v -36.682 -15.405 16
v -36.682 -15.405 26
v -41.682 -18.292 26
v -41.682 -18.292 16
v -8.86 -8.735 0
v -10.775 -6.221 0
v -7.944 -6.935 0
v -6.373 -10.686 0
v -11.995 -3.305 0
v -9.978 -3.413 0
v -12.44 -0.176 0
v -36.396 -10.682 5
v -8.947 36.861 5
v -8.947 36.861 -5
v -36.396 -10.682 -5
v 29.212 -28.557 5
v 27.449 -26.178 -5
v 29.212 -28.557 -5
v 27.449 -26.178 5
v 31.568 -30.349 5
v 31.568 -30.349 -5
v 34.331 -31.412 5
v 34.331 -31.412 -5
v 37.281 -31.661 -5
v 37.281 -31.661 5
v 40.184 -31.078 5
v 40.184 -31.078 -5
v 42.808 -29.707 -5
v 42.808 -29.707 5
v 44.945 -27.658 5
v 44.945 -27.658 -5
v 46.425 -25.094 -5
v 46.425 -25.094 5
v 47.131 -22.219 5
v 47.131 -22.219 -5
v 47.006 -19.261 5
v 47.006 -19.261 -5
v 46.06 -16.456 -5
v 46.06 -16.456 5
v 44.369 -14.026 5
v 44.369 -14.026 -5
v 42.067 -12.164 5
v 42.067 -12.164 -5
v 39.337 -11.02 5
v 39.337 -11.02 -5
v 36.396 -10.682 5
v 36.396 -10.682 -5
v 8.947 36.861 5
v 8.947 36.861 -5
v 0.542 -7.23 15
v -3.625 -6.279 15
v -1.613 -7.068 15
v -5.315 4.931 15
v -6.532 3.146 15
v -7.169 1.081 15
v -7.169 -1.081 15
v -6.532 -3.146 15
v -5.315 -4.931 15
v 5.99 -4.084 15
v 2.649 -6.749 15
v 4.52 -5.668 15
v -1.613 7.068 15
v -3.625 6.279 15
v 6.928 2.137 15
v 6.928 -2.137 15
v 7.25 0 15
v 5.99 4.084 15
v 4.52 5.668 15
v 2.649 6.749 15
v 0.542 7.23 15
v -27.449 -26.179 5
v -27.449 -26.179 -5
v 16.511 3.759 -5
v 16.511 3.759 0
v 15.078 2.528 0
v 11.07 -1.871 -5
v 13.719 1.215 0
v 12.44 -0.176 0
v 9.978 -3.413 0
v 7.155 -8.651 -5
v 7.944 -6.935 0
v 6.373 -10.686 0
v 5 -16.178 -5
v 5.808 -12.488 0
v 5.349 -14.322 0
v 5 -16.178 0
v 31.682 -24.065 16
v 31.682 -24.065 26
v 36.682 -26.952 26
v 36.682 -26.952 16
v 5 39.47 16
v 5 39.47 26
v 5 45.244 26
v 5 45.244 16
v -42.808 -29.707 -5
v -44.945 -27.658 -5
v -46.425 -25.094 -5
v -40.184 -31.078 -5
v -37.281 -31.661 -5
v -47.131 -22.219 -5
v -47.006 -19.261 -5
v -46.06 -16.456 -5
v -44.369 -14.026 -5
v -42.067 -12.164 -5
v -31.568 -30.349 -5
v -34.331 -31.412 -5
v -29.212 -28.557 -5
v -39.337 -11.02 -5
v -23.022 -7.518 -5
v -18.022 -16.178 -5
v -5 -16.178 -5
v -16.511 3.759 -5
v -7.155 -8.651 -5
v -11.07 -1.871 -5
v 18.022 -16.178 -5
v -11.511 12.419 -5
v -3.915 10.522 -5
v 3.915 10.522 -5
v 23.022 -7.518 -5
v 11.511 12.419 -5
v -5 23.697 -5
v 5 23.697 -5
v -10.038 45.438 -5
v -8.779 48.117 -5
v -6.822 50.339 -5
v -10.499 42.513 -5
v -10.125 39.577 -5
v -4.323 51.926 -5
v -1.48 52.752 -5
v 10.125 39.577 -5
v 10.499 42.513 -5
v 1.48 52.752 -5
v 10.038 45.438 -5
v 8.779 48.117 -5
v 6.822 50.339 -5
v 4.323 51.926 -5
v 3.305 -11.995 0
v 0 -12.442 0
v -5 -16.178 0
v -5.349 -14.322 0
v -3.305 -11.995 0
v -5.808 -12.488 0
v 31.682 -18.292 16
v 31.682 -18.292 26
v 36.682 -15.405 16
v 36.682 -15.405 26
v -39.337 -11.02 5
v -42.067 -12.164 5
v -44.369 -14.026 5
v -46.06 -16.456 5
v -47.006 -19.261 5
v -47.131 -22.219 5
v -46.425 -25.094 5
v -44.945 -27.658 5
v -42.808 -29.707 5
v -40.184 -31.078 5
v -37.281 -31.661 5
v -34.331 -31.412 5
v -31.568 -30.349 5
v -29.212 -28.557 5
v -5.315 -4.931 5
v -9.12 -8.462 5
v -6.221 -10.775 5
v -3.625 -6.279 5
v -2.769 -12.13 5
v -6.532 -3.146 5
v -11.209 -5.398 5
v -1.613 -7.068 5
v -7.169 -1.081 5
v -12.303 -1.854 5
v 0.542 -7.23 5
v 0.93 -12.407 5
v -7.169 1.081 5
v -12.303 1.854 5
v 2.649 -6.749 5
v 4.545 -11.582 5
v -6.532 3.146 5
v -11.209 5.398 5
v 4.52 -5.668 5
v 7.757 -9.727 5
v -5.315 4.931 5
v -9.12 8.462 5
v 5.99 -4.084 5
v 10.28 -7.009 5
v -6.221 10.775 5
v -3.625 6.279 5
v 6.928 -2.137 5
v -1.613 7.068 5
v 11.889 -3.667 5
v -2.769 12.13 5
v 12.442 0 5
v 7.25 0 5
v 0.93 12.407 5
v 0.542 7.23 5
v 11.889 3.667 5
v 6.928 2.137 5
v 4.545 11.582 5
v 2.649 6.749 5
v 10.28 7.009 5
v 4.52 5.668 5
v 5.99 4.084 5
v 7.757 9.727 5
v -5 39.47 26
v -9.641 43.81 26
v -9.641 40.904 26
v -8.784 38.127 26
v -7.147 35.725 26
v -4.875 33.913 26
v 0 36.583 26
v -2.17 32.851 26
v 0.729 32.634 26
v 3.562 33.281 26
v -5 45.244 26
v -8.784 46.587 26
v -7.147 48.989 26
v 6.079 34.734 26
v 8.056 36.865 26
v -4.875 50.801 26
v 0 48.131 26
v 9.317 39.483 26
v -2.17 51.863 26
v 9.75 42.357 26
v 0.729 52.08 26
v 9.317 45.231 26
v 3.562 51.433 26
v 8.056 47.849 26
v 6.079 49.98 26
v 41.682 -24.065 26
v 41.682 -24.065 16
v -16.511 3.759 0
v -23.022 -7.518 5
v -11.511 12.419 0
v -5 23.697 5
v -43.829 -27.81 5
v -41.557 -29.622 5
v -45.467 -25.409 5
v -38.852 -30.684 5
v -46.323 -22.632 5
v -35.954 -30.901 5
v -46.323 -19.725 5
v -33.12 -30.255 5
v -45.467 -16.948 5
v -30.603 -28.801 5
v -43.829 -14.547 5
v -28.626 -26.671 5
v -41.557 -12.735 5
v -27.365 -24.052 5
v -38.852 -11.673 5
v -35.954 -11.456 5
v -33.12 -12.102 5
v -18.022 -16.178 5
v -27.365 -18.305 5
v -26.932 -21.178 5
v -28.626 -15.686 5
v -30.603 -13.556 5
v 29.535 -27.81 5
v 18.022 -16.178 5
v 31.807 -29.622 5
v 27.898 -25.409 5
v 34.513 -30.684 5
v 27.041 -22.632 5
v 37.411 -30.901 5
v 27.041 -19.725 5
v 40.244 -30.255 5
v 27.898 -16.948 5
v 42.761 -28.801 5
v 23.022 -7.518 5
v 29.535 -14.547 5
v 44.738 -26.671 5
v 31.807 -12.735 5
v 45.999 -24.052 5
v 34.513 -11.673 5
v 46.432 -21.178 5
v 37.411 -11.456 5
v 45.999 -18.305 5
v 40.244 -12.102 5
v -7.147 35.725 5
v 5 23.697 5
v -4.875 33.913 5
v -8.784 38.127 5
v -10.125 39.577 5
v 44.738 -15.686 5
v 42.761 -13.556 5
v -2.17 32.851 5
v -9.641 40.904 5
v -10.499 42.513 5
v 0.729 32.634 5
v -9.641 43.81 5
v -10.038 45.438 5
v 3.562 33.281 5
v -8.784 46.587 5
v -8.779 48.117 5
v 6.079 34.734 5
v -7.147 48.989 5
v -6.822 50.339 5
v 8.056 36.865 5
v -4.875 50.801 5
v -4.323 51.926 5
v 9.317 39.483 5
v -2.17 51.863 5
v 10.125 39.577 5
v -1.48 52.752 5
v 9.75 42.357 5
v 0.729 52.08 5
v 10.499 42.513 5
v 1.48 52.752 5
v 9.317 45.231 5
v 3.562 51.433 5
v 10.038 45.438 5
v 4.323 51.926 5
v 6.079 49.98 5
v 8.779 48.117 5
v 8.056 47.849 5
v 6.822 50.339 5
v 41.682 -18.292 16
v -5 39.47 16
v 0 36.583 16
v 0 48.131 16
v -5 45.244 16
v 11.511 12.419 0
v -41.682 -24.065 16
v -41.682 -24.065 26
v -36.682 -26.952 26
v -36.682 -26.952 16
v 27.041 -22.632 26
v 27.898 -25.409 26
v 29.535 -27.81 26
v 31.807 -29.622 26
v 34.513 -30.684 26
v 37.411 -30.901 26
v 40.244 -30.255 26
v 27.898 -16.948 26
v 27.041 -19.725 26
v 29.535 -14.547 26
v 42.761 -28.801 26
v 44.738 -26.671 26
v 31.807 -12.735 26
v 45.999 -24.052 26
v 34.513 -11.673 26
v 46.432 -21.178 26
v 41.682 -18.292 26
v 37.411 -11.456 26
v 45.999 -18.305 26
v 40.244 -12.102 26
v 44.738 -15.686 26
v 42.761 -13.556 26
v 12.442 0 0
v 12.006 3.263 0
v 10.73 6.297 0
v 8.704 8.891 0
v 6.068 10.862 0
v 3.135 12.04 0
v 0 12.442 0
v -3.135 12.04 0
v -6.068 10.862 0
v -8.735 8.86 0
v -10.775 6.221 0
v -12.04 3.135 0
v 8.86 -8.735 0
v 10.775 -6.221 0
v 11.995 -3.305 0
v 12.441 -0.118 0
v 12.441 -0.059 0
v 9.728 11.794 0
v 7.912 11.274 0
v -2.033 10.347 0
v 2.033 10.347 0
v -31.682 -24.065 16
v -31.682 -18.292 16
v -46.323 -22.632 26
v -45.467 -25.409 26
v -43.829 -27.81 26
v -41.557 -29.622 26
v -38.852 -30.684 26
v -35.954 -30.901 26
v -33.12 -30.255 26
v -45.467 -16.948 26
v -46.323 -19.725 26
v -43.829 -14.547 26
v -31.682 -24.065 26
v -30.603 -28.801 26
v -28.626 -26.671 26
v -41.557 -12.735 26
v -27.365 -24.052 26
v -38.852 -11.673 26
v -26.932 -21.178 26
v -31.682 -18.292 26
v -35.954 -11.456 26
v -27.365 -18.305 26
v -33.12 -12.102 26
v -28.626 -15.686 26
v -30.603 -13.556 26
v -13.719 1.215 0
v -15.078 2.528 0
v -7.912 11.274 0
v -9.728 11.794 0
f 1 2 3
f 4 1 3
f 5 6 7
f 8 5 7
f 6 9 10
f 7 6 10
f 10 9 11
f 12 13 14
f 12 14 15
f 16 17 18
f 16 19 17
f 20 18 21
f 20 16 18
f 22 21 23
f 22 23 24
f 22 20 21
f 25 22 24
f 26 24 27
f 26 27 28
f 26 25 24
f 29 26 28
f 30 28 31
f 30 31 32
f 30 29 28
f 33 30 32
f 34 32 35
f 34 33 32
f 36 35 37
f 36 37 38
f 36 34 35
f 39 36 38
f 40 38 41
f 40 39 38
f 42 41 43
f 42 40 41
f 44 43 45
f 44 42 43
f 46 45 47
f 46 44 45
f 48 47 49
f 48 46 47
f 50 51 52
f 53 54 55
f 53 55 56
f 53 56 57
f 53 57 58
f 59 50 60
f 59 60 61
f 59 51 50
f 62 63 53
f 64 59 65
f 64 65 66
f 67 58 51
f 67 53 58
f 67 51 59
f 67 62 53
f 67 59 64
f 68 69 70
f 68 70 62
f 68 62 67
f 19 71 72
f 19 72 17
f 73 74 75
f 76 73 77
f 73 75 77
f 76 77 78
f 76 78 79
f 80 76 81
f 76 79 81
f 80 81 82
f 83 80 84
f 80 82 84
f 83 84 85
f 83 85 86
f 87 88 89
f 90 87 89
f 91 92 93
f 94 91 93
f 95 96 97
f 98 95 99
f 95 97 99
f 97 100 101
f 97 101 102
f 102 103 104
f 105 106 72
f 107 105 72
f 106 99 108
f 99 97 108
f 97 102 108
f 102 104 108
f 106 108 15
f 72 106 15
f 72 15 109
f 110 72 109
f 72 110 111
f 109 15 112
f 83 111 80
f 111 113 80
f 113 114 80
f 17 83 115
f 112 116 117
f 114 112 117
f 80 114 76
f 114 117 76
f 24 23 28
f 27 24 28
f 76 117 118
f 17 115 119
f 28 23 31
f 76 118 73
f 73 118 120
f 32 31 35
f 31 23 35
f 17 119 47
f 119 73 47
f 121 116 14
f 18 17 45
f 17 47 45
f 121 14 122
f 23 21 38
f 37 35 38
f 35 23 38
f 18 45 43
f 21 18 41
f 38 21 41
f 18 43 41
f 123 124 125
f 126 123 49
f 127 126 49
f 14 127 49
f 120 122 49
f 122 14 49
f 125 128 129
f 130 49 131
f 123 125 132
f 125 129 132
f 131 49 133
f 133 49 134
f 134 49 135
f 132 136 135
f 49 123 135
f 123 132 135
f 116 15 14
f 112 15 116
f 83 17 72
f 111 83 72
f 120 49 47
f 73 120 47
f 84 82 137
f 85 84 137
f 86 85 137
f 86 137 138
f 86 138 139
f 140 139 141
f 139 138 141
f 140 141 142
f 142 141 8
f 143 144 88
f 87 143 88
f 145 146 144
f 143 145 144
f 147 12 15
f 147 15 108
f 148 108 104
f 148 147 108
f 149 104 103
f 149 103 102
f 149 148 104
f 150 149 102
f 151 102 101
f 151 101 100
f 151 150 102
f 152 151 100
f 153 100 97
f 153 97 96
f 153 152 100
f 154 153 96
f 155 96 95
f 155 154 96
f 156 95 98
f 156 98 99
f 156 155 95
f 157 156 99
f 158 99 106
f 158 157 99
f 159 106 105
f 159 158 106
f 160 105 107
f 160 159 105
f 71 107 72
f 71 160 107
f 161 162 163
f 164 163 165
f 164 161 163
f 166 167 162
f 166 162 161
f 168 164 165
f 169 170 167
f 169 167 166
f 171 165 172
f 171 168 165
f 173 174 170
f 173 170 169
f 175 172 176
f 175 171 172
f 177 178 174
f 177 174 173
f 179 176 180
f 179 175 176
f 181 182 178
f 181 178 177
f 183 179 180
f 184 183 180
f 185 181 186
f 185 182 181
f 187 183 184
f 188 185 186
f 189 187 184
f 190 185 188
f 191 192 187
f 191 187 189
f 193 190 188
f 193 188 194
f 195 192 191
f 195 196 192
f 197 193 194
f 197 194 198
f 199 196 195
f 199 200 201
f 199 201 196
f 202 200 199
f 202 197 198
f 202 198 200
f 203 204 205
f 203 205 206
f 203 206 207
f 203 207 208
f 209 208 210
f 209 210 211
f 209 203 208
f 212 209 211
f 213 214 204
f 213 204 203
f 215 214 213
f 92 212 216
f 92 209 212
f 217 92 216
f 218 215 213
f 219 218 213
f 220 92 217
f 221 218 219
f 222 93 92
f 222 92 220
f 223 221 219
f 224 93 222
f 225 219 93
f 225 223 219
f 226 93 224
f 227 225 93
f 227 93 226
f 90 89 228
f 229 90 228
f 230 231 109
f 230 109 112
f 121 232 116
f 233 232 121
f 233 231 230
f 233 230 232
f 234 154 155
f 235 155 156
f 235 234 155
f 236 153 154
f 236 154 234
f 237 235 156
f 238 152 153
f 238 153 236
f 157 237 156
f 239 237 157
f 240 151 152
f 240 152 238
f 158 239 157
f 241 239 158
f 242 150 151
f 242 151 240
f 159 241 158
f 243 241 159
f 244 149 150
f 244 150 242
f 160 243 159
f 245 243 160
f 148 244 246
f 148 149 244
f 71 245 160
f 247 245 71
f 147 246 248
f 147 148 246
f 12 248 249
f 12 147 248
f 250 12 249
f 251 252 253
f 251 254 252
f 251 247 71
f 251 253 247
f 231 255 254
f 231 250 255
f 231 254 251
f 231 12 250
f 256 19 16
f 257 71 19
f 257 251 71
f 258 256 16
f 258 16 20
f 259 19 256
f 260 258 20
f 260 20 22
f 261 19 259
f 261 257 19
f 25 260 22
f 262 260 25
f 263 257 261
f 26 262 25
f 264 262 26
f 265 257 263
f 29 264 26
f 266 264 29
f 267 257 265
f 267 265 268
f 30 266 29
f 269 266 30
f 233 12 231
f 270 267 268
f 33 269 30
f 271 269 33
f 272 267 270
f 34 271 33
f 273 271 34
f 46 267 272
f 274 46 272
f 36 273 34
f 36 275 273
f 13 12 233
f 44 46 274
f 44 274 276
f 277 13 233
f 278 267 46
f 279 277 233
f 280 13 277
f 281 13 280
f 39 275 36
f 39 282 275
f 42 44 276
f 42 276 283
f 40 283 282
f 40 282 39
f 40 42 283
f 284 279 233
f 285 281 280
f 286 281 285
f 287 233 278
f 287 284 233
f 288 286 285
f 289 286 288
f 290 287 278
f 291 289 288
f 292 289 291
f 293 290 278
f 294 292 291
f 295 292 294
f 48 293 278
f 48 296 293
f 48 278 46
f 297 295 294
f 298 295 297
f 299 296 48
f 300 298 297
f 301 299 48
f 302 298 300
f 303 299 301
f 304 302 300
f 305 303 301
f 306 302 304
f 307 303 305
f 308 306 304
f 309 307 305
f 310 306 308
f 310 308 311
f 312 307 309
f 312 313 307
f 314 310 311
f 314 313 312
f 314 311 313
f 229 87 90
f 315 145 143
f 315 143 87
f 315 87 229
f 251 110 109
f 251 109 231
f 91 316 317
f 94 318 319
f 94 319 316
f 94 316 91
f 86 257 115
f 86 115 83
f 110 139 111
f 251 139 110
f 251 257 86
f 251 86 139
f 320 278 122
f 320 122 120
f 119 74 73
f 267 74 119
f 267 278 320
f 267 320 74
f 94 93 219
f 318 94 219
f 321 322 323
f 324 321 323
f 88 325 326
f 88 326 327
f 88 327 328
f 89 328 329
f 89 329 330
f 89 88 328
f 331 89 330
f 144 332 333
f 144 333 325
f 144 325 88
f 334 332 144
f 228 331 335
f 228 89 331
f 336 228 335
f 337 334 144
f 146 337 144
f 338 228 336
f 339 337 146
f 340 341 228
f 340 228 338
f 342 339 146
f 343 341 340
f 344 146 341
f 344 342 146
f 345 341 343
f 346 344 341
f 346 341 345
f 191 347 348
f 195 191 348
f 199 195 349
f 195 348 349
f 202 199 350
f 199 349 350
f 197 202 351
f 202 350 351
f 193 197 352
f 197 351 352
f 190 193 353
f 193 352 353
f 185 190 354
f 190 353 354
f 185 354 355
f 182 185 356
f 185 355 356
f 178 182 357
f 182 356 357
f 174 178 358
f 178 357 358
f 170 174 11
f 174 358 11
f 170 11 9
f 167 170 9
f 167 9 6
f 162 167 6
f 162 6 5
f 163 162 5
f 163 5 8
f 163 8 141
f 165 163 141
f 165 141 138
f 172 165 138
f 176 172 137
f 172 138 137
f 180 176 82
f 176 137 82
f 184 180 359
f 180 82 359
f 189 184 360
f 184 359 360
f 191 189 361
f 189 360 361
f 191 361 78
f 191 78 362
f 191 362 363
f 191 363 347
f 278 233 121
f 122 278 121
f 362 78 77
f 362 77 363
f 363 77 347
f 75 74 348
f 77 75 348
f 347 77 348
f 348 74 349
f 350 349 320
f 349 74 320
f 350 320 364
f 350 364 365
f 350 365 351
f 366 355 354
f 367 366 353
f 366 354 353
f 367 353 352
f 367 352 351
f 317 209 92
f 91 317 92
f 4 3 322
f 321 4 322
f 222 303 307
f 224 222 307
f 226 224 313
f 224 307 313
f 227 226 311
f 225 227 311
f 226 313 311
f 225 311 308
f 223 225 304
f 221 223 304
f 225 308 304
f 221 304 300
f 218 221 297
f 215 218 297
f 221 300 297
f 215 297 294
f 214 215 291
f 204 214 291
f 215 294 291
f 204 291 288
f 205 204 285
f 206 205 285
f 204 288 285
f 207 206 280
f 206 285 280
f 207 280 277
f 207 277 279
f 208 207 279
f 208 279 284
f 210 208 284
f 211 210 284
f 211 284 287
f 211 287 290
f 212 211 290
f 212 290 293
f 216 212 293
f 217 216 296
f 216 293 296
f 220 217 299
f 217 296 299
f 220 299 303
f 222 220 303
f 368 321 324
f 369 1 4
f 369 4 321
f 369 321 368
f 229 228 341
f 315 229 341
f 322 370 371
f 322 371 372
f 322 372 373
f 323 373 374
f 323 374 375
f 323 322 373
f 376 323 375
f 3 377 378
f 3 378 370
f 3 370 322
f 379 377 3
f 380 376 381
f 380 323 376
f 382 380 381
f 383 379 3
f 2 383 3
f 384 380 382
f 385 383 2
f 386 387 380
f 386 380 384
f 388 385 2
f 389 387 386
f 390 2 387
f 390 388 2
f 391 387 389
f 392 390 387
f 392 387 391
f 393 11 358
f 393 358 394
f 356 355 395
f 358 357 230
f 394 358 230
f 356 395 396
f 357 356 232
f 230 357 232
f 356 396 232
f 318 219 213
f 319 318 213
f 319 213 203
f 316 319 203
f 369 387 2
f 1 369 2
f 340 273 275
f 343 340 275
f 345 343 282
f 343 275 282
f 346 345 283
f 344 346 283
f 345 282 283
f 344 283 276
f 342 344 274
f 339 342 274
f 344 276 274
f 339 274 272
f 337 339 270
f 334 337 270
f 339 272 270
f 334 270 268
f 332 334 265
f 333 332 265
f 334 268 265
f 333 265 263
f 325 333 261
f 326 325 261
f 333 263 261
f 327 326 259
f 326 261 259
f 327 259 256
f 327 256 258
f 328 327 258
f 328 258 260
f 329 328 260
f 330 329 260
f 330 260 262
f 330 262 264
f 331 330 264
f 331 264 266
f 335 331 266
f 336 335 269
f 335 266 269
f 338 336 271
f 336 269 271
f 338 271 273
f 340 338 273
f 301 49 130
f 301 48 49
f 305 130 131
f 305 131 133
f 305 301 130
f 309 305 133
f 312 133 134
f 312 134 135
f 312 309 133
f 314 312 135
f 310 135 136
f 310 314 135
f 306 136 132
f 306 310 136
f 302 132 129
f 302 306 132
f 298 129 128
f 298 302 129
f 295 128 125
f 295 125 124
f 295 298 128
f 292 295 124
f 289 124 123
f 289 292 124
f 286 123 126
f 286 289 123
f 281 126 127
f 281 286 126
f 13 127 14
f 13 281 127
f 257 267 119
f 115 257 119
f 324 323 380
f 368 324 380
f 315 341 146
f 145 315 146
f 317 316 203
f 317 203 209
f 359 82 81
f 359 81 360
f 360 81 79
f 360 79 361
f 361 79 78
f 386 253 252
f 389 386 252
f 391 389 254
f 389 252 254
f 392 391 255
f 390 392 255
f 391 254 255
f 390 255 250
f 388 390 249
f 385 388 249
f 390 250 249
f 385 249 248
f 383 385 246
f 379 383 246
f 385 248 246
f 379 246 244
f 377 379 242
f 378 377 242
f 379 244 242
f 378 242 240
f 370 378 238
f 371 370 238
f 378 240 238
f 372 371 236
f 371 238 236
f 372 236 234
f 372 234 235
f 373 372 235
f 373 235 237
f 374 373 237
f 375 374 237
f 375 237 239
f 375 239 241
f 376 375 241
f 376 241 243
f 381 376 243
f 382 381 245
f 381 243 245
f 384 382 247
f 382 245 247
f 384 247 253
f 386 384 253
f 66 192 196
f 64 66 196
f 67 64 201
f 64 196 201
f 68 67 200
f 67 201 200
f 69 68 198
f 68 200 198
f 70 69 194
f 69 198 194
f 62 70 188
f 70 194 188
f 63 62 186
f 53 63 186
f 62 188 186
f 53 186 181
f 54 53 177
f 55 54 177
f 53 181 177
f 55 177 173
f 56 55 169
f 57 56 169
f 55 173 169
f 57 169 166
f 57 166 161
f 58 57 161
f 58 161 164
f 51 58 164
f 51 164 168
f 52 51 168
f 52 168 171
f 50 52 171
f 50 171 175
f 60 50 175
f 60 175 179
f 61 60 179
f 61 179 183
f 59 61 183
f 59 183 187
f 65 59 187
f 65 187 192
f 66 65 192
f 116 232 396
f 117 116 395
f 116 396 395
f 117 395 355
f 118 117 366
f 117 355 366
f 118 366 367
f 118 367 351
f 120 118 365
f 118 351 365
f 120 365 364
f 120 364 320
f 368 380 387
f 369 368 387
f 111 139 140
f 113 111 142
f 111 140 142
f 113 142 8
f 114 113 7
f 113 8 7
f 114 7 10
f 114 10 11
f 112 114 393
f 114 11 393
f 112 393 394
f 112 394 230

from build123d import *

# Parameters (mm, degrees)
BOSS_EXTRUDE1_DEPTH = 5
BOSS_EXTRUDE2_DEPTH = 5
SKETCH4_R           = 9.75
BOSS_EXTRUDE3_DEPTH = 21
SKETCH5_R           = 12.441578391
BOSS_EXTRUDE4_DEPTH = 5
SKETCH5_3_R         = 7.25
BOSS_EXTRUDE5_DEPTH = 15
CHAMFER1_SIZE       = 10
CUT_EXTRUDE1_DEPTH  = 10


with BuildPart() as part:
    # Sketch2 → Boss-Extrude1 (new body, symmetric)
    with BuildSketch(Plane.XY):
        with BuildLine():
            ThreePointArc((8.946673347, 36.860907204), (0, 52.857), (-8.946673347, 36.860907204))
            Line((-8.946673347, 36.860907204), (-36.395818719, -10.682407204))
            ThreePointArc((-36.395818719, -10.682407204), (-45.775504768, -26.4285), (-27.449145372, -26.1785))
            Line((-27.449145372, -26.1785), (27.449145372, -26.1785))
            ThreePointArc((27.449145372, -26.1785), (45.775504768, -26.4285), (36.395818719, -10.682407204))
            Line((36.395818719, -10.682407204), (8.946673347, 36.860907204))
        make_face()
        Polygon((-28.02198399, -16.1785), (0, 32.357), (28.02198399, -16.1785), align=None, mode=Mode.SUBTRACT)
    extrude(amount=BOSS_EXTRUDE1_DEPTH, both=True)

    # Sketch3 → Boss-Extrude2 (add)
    with BuildSketch(Plane.XY):
        with BuildLine():
            Line((-16.510991995, 3.759122981), (-11.510991995, 12.419377019))
            ThreePointArc((-11.510991995, 12.419377019), (0, 10.282645658), (11.510991995, 12.419377019))
            Line((11.510991995, 12.419377019), (16.510991995, 3.759122981))
            ThreePointArc((16.510991995, 3.759122981), (8.905032358, -5.141322829), (5, -16.1785))
            Line((5, -16.1785), (-5, -16.1785))
            ThreePointArc((-5, -16.1785), (-8.905032358, -5.141322829), (-16.510991995, 3.759122981))
        make_face()
    extrude(amount=-BOSS_EXTRUDE2_DEPTH)

    # Sketch4 → Boss-Extrude3 (add)
    with BuildSketch(Plane.XY.offset(5)):
        with Locations((-36.682238028, -21.1785)):
            Circle(SKETCH4_R)
        with Locations((36.682238028, -21.1785)):
            Circle(SKETCH4_R)
        with Locations((0, 42.357)):
            Circle(SKETCH4_R)
    extrude(amount=BOSS_EXTRUDE3_DEPTH)

    # Sketch5 → Boss-Extrude4 (add)
    with BuildSketch(Plane.XY):
        Circle(SKETCH5_R)
    extrude(amount=BOSS_EXTRUDE4_DEPTH)

    # Sketch5<3> → Boss-Extrude5 (add)
    with BuildSketch(Plane.XY):
        Circle(SKETCH5_3_R)
    extrude(amount=BOSS_EXTRUDE5_DEPTH)

    # Chamfer1
    chamfer1_edges = [part.edges().sort_by_distance(p)[0] for p in [
        (28.02198399, -16.1785, 0),
        (-28.02198399, -16.1785, 0),
        (0, 32.357, 0),
    ]]
    chamfer(chamfer1_edges, length=CHAMFER1_SIZE)

    # Sketch8 → Cut-Extrude1 (cut)
    with BuildSketch(Plane.XY.offset(26)):
        Polygon((-41.682238028, -24.065251346), (-36.682238028, -26.952002692), (-31.682238028, -24.065251346), (-31.682238028, -18.291748654), (-36.682238028, -15.404997308), (-41.682238028, -18.291748654), align=None)
        Polygon((41.682238028, -24.065251346), (41.682238028, -18.291748654), (36.682238028, -15.404997308), (31.682238028, -18.291748654), (31.682238028, -24.065251346), (36.682238028, -26.952002692), align=None)
        Polygon((0, 48.130502692), (-5, 45.243751346), (-5, 39.470248654), (0, 36.583497308), (5, 39.470248654), (5, 45.243751346), align=None)
    extrude(amount=-CUT_EXTRUDE1_DEPTH, mode=Mode.SUBTRACT)


solid = part.part
